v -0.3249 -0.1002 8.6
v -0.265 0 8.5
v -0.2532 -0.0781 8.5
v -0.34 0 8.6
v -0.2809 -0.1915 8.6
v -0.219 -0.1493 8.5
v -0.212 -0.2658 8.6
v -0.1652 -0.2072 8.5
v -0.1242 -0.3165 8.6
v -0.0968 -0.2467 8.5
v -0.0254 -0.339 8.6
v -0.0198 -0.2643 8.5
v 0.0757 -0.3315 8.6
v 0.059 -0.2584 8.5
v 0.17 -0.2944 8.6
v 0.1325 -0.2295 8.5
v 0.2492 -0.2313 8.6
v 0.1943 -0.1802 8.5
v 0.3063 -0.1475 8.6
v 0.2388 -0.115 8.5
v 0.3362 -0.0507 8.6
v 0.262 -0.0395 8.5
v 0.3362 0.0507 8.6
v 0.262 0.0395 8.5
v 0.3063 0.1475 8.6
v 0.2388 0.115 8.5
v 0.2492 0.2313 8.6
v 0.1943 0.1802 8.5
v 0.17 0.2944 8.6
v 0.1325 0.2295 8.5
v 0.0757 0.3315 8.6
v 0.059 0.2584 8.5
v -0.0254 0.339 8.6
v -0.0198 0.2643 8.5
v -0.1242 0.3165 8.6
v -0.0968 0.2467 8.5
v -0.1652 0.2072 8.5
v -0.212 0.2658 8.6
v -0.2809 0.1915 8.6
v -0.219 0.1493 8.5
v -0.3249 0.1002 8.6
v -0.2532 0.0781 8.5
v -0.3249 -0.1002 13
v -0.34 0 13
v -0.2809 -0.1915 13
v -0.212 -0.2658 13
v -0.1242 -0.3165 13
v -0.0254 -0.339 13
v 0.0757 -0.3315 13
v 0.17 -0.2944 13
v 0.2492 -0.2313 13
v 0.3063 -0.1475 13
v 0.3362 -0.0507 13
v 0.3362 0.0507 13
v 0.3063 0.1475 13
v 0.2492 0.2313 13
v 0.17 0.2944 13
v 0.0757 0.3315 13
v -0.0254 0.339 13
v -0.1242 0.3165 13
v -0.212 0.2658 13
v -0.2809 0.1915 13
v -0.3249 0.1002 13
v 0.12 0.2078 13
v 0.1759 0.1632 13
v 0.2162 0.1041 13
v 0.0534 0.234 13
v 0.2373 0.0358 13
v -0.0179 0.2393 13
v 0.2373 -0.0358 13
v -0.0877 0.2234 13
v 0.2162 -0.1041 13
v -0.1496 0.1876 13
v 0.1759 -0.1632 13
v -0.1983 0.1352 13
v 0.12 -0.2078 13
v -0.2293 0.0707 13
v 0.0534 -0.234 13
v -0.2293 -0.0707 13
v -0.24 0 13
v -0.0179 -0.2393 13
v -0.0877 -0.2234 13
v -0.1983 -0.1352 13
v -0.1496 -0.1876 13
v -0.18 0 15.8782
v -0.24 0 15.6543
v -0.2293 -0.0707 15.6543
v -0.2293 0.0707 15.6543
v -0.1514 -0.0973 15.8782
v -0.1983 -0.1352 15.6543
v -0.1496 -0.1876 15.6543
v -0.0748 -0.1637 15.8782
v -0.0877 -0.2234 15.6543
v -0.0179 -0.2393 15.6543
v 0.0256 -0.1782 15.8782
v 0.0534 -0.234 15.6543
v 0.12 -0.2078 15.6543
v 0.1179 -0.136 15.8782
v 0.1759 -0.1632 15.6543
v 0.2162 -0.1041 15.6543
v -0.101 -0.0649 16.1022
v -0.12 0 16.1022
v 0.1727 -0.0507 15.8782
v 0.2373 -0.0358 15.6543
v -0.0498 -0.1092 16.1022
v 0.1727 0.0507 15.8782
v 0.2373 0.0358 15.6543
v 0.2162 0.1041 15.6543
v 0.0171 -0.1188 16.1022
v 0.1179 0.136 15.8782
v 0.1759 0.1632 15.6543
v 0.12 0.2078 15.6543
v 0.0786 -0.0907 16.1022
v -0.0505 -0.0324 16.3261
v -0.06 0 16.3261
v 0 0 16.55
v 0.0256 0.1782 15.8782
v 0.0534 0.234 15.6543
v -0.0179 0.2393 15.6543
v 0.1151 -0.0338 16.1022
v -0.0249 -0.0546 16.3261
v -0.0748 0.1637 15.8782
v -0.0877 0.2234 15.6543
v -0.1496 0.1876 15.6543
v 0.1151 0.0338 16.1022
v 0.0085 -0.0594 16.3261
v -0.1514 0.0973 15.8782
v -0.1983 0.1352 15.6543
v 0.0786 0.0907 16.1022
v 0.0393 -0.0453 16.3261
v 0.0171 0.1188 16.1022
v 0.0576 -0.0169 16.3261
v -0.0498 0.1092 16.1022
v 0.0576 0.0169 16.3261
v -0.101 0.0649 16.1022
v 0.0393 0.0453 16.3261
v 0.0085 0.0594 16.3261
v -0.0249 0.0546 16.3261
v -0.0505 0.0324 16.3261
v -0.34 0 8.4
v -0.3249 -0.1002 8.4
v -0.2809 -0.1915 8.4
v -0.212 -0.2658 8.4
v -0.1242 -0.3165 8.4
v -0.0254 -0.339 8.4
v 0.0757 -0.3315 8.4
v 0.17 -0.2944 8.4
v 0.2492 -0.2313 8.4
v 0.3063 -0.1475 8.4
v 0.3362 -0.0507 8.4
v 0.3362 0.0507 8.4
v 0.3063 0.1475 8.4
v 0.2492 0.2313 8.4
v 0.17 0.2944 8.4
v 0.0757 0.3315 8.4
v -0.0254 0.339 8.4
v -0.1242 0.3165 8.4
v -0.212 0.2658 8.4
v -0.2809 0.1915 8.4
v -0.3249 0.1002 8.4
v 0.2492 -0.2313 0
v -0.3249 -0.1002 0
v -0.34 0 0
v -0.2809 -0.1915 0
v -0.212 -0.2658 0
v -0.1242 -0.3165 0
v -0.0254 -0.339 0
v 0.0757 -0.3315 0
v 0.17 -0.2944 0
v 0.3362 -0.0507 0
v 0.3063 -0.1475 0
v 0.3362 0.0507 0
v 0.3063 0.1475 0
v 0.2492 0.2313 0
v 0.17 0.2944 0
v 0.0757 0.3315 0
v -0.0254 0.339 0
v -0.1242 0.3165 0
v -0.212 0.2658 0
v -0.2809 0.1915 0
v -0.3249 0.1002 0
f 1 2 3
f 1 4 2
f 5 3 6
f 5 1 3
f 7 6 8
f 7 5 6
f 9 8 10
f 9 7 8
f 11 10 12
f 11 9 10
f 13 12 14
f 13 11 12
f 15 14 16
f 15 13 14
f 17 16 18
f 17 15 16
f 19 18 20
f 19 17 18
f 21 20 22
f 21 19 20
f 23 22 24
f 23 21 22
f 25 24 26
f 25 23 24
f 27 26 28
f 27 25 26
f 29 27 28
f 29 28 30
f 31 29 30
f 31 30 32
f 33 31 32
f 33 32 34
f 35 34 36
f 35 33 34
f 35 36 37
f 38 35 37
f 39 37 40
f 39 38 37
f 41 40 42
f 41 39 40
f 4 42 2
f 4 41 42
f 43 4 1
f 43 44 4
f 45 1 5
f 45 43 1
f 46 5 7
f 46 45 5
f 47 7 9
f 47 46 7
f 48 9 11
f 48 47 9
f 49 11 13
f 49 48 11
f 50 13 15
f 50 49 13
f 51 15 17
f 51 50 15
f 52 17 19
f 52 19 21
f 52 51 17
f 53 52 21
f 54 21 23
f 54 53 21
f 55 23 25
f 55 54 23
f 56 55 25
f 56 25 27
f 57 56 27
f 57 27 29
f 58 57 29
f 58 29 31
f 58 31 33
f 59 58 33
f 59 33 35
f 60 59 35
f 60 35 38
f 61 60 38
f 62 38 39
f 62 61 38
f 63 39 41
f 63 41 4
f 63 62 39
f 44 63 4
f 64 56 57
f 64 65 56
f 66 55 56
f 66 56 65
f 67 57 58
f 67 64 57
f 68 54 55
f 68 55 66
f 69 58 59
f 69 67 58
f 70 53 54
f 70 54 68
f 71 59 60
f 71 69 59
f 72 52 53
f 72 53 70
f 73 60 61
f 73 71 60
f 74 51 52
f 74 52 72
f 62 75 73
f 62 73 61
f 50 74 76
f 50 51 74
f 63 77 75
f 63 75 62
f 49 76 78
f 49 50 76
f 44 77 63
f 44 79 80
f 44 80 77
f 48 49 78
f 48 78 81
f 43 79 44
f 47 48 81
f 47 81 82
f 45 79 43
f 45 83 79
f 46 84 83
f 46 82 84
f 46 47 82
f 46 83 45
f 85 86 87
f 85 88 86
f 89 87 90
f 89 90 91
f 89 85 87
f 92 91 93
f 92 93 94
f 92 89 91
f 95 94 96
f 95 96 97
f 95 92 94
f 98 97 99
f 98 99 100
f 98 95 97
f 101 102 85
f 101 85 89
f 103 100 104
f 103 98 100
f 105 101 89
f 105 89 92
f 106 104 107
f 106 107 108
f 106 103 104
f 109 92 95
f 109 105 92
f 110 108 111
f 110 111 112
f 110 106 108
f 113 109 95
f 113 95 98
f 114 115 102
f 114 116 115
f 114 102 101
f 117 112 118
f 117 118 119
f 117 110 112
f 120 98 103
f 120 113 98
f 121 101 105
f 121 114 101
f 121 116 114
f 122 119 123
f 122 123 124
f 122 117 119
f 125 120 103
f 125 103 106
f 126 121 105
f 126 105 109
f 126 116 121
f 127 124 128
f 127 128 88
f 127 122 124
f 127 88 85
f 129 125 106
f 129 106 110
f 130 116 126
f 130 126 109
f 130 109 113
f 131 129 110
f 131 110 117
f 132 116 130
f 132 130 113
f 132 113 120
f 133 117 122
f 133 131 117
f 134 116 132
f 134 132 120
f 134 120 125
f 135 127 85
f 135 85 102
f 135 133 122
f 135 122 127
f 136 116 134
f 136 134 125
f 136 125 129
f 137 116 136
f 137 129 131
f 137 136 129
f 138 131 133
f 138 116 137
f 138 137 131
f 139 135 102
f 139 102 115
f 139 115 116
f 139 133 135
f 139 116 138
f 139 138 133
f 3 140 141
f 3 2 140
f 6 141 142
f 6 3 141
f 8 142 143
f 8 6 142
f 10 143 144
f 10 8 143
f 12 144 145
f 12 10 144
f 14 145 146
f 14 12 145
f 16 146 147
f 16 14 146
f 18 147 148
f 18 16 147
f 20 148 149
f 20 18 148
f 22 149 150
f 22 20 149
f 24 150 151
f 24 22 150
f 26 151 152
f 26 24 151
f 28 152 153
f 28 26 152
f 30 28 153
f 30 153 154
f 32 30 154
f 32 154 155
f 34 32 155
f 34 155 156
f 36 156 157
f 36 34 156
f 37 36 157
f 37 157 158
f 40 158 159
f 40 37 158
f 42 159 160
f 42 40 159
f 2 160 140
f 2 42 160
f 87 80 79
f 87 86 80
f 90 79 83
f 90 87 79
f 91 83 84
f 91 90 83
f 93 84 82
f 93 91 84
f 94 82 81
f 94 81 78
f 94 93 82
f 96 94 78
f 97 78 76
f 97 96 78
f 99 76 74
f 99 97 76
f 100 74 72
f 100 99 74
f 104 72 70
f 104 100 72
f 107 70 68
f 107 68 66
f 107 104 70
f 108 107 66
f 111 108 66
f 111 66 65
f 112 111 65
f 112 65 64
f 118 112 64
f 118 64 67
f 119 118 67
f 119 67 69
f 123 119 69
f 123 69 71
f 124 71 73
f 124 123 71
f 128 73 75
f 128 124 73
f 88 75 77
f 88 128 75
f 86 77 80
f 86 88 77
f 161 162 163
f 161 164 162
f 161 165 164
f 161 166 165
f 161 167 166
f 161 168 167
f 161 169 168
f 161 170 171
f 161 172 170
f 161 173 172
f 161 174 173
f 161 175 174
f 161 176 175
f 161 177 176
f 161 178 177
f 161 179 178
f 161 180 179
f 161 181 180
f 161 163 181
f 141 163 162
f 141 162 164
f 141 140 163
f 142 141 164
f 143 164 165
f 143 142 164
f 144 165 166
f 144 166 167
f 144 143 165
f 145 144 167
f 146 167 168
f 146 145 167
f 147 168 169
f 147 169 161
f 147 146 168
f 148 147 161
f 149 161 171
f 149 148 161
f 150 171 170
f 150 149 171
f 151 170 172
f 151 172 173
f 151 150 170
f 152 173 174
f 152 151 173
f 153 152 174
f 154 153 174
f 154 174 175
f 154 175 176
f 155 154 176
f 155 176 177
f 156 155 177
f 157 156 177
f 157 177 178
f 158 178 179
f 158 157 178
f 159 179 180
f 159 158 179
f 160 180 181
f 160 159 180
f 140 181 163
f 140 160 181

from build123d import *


with BuildPart() as part:
    # Sketch → Revolution (revolve)
    with BuildSketch(Plane.XZ):
        Polygon((0, 0), (-0.34, 0), (-0.34, 8.4), (-0.265, 8.5), (-0.34, 8.6), (-0.34, 13), (-0.24, 13), (-0.24, 15.654308), (0, 16.55), align=None)
    revolve(axis=Axis((0, 0, 0), (0, 0, 1)))


solid = part.part
